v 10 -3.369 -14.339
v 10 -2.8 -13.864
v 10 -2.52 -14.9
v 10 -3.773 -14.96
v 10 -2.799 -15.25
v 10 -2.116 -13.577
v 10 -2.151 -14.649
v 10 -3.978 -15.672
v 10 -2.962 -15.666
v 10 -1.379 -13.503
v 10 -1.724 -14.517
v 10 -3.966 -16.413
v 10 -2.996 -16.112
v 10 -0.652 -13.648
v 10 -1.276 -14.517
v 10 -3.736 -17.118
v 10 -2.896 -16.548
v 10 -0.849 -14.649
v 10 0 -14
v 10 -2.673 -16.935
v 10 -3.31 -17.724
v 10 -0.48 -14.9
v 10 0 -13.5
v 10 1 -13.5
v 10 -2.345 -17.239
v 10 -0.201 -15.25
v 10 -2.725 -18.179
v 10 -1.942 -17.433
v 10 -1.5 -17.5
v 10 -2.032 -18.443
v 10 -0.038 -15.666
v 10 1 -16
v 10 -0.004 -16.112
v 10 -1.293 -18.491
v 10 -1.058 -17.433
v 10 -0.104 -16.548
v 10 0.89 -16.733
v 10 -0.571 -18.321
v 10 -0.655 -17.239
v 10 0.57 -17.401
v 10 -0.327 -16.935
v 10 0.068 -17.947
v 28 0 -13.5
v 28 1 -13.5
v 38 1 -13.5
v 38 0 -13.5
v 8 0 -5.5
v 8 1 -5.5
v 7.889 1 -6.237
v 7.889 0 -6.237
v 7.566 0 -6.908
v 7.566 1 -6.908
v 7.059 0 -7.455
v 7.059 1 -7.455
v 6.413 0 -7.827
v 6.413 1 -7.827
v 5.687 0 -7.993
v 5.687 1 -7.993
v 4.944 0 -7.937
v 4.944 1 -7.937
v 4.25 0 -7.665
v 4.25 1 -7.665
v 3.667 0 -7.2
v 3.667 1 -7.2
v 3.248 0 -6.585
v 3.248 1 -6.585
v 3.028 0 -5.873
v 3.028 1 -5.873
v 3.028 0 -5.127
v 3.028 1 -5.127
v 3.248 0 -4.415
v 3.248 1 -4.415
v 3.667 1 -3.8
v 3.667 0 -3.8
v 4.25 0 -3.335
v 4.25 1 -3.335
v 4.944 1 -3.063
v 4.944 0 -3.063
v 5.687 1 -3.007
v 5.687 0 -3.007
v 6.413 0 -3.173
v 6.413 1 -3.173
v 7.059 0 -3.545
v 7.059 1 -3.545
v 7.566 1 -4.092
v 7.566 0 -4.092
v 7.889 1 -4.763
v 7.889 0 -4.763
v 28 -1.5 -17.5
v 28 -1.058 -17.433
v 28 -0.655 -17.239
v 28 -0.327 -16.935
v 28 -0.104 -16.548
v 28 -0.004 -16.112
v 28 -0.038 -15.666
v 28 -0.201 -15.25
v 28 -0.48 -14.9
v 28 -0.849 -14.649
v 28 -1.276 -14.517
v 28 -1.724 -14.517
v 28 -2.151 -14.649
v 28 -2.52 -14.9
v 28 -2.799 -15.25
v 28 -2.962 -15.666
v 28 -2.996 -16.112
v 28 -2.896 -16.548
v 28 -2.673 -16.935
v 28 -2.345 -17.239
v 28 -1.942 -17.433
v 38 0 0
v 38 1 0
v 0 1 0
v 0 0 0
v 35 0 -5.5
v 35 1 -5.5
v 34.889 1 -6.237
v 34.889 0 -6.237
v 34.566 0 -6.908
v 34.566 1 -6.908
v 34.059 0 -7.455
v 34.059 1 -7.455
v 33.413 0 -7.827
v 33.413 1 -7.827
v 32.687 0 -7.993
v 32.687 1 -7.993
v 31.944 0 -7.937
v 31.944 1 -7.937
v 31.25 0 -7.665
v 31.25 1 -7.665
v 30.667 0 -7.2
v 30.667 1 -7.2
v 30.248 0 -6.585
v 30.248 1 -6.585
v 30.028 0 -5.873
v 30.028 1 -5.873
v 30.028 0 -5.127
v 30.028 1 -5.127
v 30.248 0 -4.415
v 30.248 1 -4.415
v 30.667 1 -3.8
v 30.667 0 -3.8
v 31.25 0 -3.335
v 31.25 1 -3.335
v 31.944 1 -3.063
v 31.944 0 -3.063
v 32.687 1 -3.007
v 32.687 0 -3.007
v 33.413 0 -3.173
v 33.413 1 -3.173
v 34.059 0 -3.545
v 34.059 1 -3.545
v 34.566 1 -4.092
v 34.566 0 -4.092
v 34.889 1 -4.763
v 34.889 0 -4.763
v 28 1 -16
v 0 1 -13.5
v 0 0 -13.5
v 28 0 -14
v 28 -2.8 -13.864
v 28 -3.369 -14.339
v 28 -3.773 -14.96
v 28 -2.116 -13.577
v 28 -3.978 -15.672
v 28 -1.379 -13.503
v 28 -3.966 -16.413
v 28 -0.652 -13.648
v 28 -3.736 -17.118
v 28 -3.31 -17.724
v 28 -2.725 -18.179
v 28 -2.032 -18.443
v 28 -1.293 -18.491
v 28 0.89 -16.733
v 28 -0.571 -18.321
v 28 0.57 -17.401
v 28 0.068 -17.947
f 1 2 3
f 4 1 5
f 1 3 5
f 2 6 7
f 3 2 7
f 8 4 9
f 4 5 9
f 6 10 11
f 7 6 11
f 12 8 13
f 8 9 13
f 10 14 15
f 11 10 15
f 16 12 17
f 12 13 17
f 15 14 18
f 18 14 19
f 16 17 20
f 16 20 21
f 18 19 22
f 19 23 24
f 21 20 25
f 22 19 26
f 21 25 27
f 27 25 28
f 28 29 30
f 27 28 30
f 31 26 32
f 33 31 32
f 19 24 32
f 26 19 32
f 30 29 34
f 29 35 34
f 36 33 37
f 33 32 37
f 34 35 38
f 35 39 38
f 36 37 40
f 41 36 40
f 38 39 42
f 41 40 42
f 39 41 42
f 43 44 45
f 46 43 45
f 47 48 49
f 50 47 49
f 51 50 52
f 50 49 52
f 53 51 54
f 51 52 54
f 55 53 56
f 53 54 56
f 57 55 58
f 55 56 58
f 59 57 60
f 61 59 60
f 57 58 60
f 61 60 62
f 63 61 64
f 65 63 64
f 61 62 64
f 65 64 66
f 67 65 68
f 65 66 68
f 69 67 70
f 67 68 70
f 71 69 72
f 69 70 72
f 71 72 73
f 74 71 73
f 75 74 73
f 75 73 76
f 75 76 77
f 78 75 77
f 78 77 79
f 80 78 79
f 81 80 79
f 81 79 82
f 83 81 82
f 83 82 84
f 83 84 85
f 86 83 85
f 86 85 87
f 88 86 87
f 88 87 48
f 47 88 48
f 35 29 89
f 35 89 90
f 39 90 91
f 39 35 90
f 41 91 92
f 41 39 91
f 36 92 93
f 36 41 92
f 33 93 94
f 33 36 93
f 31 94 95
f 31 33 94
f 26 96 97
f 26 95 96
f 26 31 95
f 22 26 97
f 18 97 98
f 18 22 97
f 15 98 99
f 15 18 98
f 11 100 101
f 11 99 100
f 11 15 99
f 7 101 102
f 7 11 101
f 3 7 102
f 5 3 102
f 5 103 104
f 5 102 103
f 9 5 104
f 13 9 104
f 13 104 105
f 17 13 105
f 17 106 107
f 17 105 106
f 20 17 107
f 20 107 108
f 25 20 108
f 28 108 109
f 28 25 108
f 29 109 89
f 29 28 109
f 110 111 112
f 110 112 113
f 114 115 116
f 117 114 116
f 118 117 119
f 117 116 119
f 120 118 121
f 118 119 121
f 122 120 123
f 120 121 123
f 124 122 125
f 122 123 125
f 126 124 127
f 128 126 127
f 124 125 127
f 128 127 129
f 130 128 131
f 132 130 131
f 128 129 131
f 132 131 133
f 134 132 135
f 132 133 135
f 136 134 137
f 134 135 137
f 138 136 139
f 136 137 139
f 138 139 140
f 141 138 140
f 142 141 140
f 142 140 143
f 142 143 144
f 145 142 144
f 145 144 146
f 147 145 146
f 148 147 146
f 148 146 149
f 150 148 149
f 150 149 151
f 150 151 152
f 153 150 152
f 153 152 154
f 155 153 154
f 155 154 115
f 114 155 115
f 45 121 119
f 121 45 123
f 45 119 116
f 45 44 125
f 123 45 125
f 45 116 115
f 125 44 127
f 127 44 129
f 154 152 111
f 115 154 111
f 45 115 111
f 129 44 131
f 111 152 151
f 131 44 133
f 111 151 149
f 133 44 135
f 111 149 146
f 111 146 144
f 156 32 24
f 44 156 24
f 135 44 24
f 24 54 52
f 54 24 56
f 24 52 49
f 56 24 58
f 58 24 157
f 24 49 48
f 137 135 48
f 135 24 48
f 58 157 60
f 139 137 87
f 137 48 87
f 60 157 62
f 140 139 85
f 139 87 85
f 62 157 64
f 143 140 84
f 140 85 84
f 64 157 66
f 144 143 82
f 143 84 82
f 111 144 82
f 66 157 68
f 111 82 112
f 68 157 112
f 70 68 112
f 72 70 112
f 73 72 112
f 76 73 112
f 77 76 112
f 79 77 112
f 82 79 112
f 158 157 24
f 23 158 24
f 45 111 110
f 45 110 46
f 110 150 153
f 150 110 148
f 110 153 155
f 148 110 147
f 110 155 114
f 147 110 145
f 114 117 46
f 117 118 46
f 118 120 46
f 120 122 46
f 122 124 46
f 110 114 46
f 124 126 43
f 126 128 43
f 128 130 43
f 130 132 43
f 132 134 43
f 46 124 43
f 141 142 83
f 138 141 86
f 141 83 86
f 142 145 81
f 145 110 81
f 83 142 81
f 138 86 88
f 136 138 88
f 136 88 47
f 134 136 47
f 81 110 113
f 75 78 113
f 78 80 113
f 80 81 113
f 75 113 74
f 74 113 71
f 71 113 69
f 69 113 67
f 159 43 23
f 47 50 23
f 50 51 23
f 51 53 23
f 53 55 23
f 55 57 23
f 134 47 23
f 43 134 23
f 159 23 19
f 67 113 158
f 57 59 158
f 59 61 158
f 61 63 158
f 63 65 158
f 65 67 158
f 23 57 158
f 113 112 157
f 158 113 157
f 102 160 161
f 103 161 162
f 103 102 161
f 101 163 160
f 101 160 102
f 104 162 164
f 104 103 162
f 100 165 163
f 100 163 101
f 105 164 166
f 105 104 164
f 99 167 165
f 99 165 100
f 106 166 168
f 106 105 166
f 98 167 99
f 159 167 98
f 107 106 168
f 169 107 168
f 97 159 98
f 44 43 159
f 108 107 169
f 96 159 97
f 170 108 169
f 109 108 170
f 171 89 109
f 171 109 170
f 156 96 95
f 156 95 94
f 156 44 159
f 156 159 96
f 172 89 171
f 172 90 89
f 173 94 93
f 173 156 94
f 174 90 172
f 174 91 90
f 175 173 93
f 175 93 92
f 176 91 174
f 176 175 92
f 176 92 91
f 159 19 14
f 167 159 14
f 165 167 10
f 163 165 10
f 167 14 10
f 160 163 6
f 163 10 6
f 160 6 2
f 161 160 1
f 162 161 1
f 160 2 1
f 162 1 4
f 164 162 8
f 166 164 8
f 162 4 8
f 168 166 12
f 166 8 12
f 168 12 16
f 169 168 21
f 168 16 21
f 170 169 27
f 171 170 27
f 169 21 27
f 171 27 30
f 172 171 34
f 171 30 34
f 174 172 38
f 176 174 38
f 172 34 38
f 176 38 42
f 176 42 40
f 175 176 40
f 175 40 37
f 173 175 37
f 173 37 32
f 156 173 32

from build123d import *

# Parameters (mm, degrees)
SKETCH3_R           = 1.5
BOSS_EXTRUDE2_DEPTH = 38
SKETCH4_W           = 10
SKETCH4_H           = 5
CUT_EXTRUDE1_DEPTH  = 6
SKETCH5_R           = 2.5
CUT_EXTRUDE2_DEPTH  = 6


with BuildPart() as part:
    # Sketch3 → Boss-Extrude2 (new body)
    with BuildSketch(Plane(origin=(0, 0, 0), x_dir=(0, 0, -1), z_dir=(1, 0, 0))):
        with BuildLine():
            Line((16, 1), (0, 1))
            Line((0, 1), (0, 0))
            Line((0, 0), (14, 0))
            ThreePointArc((14, 0), (17.118033989, -3.736067977), (16, 1))
        make_face()
        with Locations((16, -1.5)):
            Circle(SKETCH3_R, mode=Mode.SUBTRACT)
    extrude(amount=BOSS_EXTRUDE2_DEPTH)

    # Sketch4 → Cut-Extrude1 (cut, through all)
    with BuildSketch(Plane(origin=(0, 1, 0), x_dir=(1, 0, 0), z_dir=(0, 1, 0))):
        with Locations((33, 16)):
            Rectangle(SKETCH4_W, SKETCH4_H)
        with Locations((5, 16)):
            Rectangle(SKETCH4_W, SKETCH4_H)
    extrude(amount=-CUT_EXTRUDE1_DEPTH, mode=Mode.SUBTRACT)

    # Sketch5 → Cut-Extrude2 (cut, through all)
    with BuildSketch(Plane(origin=(0, 1, 0), x_dir=(1, 0, 0), z_dir=(0, 1, 0))):
        with Locations((5.5, 5.5)):
            Circle(SKETCH5_R)
        with Locations((32.5, 5.5)):
            Circle(SKETCH5_R)
    extrude(amount=-CUT_EXTRUDE2_DEPTH, mode=Mode.SUBTRACT)


solid = part.part
